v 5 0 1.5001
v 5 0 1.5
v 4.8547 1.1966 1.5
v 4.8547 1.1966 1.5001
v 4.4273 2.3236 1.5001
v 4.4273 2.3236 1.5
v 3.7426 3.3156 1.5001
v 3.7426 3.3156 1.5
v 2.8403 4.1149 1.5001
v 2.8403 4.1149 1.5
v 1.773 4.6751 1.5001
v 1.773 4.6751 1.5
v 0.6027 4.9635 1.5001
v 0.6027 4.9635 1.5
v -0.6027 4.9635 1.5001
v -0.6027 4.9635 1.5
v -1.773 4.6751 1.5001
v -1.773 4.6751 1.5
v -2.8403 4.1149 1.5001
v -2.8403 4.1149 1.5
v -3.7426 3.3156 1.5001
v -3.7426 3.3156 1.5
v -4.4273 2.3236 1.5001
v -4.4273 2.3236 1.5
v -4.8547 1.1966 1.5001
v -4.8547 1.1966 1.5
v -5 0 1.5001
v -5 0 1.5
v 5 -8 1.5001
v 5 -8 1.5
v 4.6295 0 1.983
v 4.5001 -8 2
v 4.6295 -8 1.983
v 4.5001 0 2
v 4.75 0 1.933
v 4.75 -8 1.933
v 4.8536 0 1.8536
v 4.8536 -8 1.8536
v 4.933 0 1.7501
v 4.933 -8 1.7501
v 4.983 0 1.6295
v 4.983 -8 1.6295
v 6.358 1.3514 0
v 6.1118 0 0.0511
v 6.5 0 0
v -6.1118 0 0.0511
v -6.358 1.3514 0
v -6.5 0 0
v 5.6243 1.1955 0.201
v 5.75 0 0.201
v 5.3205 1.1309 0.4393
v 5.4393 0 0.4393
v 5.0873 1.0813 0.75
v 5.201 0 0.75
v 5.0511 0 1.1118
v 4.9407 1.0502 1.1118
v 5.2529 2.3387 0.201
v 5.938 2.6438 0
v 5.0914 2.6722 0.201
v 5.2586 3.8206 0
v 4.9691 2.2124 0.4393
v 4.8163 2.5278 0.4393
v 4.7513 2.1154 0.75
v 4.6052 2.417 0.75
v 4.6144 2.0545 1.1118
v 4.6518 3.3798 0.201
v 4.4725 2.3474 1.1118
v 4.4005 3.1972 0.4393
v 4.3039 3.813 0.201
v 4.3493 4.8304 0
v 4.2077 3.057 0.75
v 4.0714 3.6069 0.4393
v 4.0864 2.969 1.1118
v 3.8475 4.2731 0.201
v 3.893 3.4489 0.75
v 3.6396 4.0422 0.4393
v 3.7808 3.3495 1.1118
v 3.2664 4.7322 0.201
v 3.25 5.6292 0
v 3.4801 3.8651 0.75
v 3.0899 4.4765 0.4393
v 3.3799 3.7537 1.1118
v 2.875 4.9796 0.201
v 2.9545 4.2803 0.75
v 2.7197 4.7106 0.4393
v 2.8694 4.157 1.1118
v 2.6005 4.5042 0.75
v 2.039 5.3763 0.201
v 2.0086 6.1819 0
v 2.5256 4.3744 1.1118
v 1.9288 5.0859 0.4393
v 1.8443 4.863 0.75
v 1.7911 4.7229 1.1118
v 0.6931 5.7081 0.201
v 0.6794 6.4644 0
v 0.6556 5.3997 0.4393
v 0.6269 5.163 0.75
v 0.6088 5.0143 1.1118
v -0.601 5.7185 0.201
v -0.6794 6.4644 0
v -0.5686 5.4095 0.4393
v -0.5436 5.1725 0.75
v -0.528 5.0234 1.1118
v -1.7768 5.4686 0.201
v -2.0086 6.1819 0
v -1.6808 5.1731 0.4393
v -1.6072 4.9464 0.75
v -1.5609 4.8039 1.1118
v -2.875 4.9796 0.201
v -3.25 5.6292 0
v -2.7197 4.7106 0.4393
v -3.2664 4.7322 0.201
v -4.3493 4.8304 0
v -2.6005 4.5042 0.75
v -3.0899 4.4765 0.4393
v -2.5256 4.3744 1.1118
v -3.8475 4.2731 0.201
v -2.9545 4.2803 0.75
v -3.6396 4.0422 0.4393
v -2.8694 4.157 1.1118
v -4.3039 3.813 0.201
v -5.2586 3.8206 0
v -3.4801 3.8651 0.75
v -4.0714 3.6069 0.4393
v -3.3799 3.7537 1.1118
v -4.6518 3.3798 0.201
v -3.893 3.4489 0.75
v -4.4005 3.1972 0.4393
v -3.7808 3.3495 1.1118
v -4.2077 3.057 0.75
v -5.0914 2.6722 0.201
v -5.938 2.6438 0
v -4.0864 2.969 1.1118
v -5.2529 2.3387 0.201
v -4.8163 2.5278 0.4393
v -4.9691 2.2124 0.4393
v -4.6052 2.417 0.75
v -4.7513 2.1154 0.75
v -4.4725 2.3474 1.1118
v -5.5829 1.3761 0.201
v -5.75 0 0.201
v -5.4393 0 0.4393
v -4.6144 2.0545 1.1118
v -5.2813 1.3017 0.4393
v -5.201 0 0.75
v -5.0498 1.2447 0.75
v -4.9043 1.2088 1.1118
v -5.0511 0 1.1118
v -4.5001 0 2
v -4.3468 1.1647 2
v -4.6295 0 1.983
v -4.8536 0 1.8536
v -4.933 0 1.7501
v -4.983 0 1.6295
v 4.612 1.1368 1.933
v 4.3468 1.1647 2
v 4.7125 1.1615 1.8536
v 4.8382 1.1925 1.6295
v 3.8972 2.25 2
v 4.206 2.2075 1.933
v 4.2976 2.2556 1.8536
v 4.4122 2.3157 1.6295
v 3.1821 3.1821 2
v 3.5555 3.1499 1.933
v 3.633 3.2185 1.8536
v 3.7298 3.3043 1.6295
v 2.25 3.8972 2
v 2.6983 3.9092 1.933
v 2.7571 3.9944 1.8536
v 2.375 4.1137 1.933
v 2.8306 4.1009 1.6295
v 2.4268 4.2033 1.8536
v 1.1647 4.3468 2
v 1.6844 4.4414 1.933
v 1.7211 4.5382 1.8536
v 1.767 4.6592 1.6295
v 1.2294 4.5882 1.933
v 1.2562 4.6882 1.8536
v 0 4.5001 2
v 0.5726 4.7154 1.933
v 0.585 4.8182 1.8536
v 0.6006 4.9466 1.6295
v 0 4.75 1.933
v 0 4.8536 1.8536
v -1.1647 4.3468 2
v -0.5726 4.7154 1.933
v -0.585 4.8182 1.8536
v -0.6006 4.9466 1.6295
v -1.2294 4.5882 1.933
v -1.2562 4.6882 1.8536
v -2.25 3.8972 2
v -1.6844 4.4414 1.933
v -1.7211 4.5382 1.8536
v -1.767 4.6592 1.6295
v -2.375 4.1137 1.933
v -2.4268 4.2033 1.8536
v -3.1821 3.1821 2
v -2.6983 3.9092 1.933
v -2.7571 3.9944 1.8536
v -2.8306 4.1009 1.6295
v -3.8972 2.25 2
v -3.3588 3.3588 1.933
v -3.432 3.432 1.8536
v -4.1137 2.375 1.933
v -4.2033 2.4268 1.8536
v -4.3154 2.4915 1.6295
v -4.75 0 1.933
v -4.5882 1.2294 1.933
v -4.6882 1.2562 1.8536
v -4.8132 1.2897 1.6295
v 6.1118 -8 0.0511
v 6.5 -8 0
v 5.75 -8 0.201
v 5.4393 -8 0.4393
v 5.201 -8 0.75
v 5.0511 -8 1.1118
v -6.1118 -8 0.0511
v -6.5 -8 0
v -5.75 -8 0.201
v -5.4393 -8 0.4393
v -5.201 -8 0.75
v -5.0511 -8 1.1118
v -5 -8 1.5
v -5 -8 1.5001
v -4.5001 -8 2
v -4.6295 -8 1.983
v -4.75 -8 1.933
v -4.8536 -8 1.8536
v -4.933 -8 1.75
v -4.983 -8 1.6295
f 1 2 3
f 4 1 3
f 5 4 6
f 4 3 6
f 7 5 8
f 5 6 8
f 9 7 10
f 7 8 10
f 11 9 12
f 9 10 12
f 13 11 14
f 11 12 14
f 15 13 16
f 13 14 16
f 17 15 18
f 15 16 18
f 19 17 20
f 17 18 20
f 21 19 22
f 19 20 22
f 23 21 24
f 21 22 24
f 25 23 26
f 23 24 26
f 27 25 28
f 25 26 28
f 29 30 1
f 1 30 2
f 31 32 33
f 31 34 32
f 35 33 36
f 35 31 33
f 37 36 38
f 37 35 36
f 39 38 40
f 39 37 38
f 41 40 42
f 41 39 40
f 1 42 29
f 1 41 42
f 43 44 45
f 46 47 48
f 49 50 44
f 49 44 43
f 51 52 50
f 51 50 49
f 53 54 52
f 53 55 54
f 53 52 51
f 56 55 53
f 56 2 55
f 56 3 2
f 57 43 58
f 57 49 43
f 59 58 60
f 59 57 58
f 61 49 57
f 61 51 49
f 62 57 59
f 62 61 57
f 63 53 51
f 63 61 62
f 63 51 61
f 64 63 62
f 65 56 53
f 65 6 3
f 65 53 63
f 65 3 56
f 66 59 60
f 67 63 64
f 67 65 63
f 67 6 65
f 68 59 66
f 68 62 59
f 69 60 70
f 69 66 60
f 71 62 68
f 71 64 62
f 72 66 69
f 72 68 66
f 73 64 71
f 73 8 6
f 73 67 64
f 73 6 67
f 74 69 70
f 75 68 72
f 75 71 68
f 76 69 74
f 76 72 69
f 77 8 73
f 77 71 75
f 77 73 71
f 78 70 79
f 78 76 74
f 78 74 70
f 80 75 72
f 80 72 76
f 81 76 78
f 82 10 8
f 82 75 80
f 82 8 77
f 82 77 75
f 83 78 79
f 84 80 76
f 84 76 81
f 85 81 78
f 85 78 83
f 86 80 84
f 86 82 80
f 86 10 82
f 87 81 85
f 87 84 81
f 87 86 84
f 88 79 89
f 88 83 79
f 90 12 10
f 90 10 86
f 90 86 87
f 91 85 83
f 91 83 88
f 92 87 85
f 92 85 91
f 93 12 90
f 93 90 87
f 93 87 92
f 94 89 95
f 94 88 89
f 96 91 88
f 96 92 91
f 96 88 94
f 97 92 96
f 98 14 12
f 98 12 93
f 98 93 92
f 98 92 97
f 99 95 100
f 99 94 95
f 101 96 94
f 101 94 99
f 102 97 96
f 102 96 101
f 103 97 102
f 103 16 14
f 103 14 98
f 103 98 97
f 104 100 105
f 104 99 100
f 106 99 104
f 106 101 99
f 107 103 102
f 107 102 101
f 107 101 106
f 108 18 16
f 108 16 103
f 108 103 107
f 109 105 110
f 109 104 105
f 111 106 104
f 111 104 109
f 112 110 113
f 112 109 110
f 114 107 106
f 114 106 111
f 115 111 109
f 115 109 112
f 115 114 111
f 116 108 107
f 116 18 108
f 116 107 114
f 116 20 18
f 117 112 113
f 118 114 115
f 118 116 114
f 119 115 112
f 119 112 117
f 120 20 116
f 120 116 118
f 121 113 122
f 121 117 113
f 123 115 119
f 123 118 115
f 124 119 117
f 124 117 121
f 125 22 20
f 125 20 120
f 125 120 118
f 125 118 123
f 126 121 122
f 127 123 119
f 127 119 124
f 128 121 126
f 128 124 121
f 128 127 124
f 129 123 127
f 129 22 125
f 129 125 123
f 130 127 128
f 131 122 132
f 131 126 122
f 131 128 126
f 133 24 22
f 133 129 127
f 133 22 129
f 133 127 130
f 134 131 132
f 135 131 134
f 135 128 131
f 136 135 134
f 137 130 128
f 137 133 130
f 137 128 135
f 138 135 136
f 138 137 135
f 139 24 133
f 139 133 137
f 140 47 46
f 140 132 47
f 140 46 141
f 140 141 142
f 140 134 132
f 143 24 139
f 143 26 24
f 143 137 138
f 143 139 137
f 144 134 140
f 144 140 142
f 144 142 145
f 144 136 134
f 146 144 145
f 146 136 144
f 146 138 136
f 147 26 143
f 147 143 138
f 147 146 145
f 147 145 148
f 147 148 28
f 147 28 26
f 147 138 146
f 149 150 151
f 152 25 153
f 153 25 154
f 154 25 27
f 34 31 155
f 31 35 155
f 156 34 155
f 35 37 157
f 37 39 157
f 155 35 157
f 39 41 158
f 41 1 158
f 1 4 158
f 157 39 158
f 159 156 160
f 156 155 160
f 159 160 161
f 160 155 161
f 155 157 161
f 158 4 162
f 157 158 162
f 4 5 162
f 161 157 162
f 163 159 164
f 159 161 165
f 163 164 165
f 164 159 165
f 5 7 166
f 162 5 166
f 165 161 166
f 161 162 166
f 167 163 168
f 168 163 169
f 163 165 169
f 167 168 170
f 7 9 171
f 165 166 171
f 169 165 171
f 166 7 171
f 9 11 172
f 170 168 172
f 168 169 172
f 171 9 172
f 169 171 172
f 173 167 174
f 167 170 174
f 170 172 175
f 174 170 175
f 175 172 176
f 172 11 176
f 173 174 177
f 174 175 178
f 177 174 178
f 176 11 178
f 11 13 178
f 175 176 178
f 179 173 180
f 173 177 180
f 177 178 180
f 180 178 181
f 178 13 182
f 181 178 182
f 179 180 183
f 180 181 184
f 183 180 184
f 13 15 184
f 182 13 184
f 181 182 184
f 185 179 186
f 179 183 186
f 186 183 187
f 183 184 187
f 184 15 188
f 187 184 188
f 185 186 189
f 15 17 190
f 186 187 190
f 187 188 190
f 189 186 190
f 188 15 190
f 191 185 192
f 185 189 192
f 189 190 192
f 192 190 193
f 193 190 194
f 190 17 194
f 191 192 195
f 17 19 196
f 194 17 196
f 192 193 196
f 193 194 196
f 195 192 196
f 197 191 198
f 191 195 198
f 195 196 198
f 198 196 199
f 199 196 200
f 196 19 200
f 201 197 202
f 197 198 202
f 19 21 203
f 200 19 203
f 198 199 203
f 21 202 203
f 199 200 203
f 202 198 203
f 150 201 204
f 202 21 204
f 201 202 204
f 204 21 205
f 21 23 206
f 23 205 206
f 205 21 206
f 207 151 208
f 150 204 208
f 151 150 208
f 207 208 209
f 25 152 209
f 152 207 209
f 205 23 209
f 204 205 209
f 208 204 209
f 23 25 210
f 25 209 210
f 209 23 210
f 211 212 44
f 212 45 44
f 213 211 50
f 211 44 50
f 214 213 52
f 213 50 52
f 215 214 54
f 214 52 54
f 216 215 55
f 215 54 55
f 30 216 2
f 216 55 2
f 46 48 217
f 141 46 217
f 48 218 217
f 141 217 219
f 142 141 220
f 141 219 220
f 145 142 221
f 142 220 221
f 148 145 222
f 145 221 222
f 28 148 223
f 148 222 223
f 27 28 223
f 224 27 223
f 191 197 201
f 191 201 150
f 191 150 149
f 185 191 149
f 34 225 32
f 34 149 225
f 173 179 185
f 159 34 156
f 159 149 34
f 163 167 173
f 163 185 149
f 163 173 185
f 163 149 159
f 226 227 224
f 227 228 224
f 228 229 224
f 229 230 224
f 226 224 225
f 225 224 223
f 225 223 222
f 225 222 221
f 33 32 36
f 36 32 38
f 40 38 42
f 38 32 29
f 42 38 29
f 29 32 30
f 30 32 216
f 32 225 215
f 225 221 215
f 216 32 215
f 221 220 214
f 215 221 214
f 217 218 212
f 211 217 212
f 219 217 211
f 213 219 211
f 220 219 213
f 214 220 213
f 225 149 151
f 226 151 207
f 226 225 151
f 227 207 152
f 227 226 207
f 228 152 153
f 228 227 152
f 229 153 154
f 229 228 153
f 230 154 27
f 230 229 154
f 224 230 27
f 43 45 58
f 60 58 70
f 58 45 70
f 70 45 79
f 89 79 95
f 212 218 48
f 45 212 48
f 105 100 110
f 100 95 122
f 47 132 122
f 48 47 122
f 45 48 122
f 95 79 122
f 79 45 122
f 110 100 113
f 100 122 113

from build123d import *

# Parameters (mm, degrees)
EXTRUDE_1_DEPTH     = 2
SKETCH_2_W          = 17
SKETCH_2_H          = 17
EXTRUDE_2_DEPTH     = 5
FILLET_1_R          = 1.5
FILLET_2_R          = 0.5
SKETCH_3_W          = 5
SKETCH_3_H          = 17
CUT_EXTRUDE_4_DEPTH = 21.346989949


with BuildPart() as part:
    # 草图1 → 凸台-拉伸1 (new body)
    with BuildSketch(Plane.XY):
        with BuildLine():
            Line((-5, 0), (-5, -8))
            Line((-5, -8), (5, -8))
            Line((5, -8), (5, 0))
            ThreePointArc((5, 0), (0, 5), (-5, 0))
        make_face()
    extrude(amount=EXTRUDE_1_DEPTH)

    # 草图2 → 凸台-拉伸2 (add)
    with BuildSketch(Plane(origin=(0, 0, 0), x_dir=(-1, 0, 0), z_dir=(0, 0, -1))):
        with Locations((-1, -1.5)):
            Rectangle(SKETCH_2_W, SKETCH_2_H)
    extrude(amount=EXTRUDE_2_DEPTH)

    # 圆角1
    fillet_1_edges = [part.edges().sort_by_distance(p)[0] for p in [
        (5, -4, 0),
        (-5, -4, 0),
        (0, 5, 0),
    ]]
    fillet(fillet_1_edges, radius=FILLET_1_R)

    # 圆角2
    fillet_2_edges = [part.edges().sort_by_distance(p)[0] for p in [
        (5, -4, 2),
        (-5, -4, 2),
        (0, 5, 2),
    ]]
    fillet(fillet_2_edges, radius=FILLET_2_R - 0.0001)  # a hair under: the kernel refuses the full size

    # 草图3 → 切除-拉伸4 (cut, through all)
    with BuildSketch(Plane.ZY.offset(7.5)):
        with Locations((-2.5, -1.5)):
            Rectangle(SKETCH_3_W, SKETCH_3_H)
    extrude(amount=-CUT_EXTRUDE_4_DEPTH, mode=Mode.SUBTRACT)


solid = part.part
